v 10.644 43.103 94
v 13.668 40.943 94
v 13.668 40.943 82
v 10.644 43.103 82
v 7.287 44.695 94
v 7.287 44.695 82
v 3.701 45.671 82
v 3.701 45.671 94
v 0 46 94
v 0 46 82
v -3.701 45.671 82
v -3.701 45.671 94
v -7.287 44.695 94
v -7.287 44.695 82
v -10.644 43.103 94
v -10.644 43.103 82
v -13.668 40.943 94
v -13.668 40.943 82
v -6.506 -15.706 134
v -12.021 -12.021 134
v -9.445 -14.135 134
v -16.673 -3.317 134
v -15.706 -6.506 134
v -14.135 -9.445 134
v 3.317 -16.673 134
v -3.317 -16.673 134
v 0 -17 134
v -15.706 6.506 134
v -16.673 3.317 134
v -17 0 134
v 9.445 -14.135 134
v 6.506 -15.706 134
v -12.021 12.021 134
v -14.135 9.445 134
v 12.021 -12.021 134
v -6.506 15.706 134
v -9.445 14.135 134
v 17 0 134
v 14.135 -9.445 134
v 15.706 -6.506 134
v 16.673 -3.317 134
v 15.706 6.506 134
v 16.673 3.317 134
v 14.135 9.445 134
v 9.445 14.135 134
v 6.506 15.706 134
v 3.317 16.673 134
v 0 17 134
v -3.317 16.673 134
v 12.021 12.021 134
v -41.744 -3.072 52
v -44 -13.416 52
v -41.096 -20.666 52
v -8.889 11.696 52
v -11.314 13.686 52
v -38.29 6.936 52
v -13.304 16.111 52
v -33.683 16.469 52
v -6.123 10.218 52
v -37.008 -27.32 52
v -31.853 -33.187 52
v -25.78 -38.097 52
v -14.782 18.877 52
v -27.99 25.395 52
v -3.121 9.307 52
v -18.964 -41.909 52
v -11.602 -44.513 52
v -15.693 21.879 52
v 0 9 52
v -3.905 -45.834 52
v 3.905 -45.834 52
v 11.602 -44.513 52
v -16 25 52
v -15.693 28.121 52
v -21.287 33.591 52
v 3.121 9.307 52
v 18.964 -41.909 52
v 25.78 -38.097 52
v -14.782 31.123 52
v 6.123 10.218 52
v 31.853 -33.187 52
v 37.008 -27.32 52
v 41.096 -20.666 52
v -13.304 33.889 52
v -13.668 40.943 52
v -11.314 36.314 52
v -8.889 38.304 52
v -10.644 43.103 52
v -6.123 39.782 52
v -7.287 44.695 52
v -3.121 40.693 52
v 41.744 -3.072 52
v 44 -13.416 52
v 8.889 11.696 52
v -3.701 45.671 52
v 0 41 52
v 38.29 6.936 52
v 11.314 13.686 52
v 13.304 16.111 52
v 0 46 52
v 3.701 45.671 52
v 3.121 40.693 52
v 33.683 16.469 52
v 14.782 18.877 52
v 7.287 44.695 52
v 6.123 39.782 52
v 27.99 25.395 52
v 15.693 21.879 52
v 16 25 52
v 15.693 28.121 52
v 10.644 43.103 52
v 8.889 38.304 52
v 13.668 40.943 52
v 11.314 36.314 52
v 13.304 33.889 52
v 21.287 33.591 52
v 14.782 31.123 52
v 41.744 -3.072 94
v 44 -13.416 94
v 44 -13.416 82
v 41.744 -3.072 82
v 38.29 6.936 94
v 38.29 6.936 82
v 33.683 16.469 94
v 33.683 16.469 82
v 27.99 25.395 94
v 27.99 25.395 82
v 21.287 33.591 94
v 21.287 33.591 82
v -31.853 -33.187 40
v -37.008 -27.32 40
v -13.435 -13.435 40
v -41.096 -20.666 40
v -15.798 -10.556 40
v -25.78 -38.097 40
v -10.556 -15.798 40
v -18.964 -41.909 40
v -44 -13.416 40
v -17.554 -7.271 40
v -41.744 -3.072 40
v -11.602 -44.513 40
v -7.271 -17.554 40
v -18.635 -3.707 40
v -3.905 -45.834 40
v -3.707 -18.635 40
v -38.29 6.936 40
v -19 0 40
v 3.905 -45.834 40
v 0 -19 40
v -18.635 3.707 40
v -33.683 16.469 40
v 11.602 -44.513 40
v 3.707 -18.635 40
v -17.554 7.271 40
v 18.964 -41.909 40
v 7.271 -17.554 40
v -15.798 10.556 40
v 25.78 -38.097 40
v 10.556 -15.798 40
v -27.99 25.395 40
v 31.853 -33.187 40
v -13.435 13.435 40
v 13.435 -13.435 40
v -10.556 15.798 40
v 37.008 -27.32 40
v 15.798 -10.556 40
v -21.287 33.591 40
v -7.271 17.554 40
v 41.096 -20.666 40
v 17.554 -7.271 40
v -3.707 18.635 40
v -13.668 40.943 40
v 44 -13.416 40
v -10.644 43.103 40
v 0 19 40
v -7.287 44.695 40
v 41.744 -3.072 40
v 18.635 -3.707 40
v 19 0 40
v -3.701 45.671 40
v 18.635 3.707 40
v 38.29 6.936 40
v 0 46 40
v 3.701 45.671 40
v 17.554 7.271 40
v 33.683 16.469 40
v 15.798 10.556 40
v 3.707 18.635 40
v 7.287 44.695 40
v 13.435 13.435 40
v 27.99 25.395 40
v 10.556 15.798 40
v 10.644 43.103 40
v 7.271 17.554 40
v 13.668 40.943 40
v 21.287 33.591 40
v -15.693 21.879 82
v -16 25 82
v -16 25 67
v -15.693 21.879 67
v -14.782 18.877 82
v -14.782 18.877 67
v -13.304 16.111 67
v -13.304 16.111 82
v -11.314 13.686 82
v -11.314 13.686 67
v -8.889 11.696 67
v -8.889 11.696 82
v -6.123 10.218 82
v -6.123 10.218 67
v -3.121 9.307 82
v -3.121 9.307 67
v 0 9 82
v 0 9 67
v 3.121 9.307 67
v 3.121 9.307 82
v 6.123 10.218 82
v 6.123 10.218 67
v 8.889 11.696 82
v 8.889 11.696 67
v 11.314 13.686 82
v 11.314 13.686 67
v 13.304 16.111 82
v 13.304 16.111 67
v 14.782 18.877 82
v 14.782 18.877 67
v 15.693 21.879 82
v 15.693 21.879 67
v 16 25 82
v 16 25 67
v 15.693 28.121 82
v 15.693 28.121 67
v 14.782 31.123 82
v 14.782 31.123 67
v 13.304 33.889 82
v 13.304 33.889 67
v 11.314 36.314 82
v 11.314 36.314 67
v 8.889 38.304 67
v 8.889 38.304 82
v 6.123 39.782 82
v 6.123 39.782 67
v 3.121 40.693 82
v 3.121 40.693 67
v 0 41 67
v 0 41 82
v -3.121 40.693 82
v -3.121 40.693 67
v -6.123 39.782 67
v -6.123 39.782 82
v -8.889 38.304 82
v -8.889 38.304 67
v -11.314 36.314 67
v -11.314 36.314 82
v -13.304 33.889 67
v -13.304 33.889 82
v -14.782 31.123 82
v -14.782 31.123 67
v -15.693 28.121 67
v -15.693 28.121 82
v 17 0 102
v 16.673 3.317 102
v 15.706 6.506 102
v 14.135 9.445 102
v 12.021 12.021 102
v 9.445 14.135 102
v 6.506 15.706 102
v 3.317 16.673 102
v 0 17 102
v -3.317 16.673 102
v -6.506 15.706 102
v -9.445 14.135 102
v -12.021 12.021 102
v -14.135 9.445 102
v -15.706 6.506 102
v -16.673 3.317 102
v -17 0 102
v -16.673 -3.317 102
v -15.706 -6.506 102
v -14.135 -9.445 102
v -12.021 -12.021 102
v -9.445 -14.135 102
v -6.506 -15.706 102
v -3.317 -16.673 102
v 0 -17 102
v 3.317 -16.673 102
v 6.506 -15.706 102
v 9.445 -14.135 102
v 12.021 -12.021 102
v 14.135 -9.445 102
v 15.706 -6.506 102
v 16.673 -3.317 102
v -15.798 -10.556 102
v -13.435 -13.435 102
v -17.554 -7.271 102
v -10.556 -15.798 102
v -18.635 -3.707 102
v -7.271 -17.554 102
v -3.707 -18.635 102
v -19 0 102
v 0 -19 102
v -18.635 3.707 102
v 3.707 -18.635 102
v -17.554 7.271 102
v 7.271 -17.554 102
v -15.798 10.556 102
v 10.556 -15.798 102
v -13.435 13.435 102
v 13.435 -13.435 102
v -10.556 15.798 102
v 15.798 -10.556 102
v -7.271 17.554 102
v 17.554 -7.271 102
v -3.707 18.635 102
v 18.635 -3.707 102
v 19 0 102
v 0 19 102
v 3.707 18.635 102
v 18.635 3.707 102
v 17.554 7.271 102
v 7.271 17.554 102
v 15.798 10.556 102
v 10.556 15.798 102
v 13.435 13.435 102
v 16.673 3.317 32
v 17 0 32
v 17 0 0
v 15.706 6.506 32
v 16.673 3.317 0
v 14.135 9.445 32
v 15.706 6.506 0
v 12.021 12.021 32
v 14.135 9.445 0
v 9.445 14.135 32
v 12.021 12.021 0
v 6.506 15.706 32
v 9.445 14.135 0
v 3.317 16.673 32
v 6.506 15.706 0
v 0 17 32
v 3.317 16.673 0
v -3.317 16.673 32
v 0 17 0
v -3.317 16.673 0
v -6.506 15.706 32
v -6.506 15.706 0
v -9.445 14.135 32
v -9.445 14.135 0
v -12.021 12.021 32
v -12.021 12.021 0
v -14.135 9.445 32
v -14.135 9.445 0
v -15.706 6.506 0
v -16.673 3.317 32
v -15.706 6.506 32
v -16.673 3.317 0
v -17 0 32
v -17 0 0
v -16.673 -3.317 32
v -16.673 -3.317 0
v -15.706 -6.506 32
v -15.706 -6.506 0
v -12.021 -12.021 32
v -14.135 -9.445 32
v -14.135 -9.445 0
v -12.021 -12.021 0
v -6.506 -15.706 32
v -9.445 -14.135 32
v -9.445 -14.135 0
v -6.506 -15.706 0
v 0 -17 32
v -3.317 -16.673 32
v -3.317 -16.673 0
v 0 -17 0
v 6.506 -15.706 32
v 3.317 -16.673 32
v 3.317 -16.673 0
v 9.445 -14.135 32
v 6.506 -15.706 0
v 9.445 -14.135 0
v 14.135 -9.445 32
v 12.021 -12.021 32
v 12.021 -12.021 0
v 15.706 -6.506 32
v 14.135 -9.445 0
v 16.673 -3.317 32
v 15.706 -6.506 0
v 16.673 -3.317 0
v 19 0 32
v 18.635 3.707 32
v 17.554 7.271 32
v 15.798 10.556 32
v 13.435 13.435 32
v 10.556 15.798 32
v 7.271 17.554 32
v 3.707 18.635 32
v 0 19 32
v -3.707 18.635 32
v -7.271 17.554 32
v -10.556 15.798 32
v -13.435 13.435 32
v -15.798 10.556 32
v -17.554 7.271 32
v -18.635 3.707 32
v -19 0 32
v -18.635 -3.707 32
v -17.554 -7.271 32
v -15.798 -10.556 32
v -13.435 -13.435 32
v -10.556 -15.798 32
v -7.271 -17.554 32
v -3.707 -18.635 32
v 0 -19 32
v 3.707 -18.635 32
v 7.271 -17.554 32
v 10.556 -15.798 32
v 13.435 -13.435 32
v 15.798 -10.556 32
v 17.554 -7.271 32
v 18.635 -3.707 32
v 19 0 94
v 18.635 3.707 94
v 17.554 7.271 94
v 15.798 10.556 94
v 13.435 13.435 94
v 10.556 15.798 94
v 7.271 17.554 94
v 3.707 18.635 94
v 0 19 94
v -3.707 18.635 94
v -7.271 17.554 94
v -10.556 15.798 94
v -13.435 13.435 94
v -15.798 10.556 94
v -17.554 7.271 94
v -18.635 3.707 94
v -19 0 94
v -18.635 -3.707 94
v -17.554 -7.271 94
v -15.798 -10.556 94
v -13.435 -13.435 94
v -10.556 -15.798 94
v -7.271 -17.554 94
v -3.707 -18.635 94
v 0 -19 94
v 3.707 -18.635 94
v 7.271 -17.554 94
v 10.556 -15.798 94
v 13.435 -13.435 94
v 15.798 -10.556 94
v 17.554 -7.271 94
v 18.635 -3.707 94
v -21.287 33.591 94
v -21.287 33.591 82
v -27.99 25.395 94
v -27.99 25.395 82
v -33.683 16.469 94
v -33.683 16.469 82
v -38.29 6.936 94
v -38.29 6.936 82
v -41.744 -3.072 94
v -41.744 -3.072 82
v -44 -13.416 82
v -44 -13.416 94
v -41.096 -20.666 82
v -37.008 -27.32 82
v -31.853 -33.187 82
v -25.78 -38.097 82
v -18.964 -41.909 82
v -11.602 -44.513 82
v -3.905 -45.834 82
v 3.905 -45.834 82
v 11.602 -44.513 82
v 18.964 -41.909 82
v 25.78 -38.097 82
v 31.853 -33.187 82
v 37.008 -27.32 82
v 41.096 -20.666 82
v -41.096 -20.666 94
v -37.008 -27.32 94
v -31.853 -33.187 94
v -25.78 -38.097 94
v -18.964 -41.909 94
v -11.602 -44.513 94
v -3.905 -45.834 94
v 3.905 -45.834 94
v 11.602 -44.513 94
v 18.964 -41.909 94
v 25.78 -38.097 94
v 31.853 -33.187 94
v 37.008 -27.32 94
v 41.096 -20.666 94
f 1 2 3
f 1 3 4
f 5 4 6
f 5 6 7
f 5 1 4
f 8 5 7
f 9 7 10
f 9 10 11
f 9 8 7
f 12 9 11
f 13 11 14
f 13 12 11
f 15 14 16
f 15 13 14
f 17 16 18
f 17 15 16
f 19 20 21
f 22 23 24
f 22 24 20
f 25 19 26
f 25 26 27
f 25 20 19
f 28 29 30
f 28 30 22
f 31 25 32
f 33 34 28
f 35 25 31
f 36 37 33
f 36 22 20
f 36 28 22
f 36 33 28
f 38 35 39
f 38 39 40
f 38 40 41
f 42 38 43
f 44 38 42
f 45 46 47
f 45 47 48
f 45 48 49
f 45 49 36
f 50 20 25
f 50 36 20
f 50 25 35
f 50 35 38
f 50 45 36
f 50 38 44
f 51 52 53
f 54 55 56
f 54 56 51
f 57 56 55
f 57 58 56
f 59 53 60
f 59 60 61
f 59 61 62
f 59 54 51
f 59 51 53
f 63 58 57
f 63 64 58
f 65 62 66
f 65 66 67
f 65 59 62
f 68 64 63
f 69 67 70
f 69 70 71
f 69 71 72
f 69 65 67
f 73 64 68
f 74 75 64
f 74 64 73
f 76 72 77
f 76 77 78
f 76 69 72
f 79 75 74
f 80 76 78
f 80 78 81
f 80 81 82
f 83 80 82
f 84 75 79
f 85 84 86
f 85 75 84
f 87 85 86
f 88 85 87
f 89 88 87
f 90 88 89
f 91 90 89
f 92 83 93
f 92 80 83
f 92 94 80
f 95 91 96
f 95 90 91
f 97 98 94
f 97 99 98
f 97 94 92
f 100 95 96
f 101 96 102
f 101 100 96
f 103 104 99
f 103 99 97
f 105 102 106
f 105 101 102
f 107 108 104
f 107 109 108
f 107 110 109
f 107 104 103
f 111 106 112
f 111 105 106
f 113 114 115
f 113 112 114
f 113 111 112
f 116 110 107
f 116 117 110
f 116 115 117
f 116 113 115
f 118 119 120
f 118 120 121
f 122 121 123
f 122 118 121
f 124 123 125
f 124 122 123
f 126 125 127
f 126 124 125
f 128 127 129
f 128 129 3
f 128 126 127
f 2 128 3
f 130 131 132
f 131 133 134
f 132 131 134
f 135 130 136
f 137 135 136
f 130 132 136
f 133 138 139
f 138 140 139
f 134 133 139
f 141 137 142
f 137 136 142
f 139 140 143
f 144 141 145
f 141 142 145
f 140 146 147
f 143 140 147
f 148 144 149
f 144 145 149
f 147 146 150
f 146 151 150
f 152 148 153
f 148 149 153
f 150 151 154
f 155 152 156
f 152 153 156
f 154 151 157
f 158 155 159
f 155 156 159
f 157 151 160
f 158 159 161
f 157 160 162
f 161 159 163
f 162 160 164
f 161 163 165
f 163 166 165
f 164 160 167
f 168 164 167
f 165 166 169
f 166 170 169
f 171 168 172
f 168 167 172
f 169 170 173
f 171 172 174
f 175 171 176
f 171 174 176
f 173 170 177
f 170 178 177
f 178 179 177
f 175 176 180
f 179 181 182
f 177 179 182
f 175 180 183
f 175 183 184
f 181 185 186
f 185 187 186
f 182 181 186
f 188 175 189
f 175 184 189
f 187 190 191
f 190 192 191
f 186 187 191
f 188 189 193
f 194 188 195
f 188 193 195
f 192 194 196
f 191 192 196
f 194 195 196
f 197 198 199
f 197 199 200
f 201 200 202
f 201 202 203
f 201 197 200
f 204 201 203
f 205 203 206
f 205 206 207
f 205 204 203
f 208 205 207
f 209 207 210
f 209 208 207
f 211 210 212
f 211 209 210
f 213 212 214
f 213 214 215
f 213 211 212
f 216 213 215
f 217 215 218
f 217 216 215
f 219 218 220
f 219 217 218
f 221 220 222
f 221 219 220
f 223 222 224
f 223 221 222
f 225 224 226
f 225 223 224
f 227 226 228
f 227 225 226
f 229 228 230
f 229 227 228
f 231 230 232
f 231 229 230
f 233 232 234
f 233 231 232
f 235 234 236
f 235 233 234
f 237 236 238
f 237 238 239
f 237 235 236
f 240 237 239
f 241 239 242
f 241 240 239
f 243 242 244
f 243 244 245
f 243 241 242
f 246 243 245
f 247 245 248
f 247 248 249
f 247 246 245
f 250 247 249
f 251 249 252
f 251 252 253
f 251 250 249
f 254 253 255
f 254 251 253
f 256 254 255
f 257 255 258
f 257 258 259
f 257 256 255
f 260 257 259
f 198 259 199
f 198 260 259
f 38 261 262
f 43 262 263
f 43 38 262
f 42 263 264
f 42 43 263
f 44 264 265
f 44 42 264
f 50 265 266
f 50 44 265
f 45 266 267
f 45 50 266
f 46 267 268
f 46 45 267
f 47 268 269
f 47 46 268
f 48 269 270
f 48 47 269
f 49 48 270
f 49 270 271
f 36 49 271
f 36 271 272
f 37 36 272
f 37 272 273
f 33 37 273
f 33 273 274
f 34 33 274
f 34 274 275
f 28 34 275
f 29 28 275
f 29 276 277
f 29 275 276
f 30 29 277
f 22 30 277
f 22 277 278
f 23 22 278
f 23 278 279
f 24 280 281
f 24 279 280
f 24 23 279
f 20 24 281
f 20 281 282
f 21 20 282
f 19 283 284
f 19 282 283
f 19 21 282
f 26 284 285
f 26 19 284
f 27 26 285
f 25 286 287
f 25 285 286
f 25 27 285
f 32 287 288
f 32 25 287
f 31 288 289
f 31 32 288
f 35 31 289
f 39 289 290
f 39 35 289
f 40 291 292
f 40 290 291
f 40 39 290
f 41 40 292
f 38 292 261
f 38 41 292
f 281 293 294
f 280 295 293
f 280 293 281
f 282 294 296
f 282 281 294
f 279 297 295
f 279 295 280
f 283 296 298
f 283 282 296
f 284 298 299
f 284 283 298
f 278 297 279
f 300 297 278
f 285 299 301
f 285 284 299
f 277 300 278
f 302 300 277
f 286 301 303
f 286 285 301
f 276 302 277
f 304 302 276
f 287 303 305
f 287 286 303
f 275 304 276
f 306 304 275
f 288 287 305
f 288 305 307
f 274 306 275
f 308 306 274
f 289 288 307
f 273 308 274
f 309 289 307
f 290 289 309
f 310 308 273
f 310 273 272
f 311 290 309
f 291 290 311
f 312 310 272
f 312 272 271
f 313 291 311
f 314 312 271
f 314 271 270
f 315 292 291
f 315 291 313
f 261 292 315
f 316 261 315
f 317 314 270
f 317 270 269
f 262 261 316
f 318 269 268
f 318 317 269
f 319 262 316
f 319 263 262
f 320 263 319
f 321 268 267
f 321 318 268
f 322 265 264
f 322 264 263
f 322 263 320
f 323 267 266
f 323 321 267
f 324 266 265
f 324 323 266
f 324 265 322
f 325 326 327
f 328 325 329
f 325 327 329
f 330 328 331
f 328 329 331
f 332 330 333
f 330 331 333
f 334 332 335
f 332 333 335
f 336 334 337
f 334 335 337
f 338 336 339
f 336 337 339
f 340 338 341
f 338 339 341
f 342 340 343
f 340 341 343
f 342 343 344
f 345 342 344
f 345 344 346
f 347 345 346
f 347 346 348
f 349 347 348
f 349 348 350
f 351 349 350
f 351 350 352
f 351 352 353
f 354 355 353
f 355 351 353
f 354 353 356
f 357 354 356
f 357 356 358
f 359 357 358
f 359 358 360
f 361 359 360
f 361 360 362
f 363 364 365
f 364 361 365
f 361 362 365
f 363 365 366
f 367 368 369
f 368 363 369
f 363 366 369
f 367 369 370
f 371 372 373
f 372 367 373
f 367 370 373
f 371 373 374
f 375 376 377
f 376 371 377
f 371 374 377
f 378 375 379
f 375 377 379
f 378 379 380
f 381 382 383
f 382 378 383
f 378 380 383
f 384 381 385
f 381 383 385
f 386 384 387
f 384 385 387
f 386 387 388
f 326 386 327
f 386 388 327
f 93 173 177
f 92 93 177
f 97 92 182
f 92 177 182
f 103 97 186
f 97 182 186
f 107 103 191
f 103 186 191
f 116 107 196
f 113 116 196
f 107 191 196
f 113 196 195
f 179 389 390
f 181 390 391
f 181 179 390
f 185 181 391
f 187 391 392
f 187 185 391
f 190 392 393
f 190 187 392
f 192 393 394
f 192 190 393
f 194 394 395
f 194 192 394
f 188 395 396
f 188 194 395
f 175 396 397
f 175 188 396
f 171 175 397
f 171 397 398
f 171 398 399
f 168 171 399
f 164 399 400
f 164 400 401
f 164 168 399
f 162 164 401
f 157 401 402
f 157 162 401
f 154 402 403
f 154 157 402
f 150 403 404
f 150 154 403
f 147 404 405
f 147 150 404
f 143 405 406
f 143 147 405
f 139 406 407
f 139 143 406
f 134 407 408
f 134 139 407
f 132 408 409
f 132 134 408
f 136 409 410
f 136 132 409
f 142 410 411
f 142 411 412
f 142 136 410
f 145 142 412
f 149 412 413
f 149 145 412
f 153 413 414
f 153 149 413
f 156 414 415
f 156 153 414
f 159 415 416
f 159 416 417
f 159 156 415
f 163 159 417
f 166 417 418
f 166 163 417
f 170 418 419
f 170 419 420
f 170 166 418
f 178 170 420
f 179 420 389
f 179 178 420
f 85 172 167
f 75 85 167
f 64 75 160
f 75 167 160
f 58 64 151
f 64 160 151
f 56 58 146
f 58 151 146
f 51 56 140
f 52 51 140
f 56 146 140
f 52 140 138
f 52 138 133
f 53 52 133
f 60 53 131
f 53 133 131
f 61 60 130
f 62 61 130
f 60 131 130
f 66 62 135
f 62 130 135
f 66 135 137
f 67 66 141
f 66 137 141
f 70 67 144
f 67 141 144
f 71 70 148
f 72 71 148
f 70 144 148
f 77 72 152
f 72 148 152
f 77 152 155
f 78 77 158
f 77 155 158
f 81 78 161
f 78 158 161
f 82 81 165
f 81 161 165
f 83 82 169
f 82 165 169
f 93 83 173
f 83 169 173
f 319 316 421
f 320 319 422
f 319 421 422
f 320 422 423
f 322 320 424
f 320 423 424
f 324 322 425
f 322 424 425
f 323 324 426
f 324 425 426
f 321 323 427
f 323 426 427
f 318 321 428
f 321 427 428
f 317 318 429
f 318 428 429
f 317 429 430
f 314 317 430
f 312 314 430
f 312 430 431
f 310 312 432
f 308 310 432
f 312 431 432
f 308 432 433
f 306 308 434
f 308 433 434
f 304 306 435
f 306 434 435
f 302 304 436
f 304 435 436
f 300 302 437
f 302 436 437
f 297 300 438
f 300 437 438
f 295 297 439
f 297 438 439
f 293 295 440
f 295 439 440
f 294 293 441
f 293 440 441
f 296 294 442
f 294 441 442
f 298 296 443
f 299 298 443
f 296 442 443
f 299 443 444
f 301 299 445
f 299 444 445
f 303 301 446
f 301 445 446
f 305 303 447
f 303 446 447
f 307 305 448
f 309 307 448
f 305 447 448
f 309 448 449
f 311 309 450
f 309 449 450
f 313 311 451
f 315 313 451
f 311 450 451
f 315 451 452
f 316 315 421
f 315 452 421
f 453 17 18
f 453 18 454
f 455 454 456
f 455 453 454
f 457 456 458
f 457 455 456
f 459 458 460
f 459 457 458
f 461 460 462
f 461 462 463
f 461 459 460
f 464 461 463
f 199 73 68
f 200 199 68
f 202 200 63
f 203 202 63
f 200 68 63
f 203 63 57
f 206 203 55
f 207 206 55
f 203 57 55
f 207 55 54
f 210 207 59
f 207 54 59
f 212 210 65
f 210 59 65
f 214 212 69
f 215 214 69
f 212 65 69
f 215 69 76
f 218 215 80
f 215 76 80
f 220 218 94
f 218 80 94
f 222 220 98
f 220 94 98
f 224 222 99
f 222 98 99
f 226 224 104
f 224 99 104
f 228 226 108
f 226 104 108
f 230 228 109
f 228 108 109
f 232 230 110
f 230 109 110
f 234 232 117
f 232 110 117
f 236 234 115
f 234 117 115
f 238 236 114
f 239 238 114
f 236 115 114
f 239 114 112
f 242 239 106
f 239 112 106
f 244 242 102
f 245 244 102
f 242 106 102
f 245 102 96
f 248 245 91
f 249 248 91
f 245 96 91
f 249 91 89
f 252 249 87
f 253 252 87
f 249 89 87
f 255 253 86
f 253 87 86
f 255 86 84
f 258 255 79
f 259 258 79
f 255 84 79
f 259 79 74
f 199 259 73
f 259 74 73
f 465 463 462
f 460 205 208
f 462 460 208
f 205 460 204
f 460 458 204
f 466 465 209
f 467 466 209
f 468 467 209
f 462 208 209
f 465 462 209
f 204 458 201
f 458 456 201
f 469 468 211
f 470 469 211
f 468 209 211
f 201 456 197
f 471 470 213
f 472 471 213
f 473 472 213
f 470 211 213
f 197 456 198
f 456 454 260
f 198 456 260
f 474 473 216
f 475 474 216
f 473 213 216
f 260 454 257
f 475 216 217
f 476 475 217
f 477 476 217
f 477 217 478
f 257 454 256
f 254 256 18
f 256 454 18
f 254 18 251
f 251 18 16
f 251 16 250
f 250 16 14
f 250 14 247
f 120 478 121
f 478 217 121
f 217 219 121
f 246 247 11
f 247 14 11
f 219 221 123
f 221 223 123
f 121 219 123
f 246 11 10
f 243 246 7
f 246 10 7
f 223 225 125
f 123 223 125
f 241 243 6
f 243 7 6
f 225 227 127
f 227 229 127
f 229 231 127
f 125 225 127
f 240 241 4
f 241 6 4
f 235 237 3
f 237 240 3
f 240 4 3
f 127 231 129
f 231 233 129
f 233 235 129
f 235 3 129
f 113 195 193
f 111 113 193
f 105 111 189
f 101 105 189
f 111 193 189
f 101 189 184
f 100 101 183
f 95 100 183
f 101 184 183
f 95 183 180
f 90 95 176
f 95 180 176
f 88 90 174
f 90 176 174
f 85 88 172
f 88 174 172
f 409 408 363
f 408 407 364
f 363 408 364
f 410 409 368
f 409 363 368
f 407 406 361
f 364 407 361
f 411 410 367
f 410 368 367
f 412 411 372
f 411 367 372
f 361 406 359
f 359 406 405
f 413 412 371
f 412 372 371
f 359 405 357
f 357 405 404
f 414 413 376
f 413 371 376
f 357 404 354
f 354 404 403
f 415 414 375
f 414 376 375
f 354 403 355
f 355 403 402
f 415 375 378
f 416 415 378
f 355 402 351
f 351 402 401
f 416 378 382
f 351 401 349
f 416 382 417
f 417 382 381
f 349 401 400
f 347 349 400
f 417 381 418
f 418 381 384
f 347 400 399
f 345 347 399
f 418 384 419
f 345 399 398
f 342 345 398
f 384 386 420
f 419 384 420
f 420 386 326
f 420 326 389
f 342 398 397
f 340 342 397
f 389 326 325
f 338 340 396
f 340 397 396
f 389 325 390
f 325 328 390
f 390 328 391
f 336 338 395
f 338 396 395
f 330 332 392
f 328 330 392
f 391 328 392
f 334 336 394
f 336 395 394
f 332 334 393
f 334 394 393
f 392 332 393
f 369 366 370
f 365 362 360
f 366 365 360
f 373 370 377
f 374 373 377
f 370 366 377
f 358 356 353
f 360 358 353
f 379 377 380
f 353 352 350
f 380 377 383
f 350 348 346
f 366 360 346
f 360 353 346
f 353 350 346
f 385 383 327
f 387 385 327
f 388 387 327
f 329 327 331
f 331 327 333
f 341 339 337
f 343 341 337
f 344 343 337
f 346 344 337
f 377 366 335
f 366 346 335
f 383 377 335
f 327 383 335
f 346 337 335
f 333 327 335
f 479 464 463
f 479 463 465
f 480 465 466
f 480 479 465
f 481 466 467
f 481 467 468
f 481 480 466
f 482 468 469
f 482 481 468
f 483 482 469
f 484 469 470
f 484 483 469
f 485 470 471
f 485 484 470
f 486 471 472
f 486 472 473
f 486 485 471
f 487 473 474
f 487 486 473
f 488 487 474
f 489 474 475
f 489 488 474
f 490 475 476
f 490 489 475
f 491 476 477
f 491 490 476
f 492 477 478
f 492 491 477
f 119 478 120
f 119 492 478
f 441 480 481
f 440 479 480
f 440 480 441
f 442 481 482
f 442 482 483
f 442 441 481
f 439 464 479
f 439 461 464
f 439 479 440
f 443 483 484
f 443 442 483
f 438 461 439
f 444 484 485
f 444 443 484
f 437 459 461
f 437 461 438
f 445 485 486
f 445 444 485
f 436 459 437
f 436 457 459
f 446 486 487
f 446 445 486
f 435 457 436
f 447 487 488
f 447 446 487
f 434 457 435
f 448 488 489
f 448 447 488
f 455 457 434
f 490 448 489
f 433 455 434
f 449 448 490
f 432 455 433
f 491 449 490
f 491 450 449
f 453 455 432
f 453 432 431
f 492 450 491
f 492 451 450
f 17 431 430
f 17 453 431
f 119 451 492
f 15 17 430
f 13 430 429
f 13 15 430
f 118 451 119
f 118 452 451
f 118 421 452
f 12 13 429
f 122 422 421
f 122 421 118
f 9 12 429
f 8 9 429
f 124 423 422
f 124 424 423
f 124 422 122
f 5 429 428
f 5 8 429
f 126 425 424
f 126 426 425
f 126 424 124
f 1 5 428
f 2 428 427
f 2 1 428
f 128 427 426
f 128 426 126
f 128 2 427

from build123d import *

# Parameters (mm, degrees)
SKETCH3_R           = 17
BOSS_EXTRUDE1_DEPTH = 40
SKETCH6_R           = 19
BOSS_EXTRUDE2_DEPTH = 8
BOSS_EXTRUDE3_DEPTH = 12
SKETCH8_R           = 16
BOSS_EXTRUDE4_DEPTH = 15


with BuildPart() as part:
    # Sketch3 → Boss-Extrude1 (new body)
    with BuildSketch(Plane.XY):
        Circle(SKETCH3_R)
    extrude(amount=BOSS_EXTRUDE1_DEPTH)

    # Sketch6 → Boss-Extrude2 (add)
    with BuildSketch(Plane.XY.offset(40)):
        Circle(SKETCH6_R)
    extrude(amount=-BOSS_EXTRUDE2_DEPTH)

    # Sketch7 → Boss-Extrude3 (add)
    with BuildSketch(Plane.XY.offset(40)):
        with BuildLine():
            ThreePointArc((-44, -13.416407865), (0, -46), (44, -13.416407865))
            ThreePointArc((44, -13.416407865), (33.683444249, 16.469257624), (13.668094758, 40.943123461))
            ThreePointArc((13.668094758, 40.943123461), (0, 46), (-13.668094758, 40.943123461))
            ThreePointArc((-13.668094758, 40.943123461), (-33.683444249, 16.469257624), (-44, -13.416407865))
        make_face()
    extrude(amount=BOSS_EXTRUDE3_DEPTH)

    # Sketch8 → Boss-Extrude4 (add)
    with BuildSketch(Plane.XY.offset(52)):
        with Locations(Location((0, 25, 0), (0, 0, 180))):
            Circle(SKETCH8_R)
    extrude(amount=BOSS_EXTRUDE4_DEPTH)

    # Mirror2: part across plane


with BuildPart() as part_1:
    add(part.part)
    add(part.part.mirror(Plane(origin=(0, 25, 67), x_dir=(1, 0, 0), z_dir=(0, 0, 1))))


solid = part_1.part
